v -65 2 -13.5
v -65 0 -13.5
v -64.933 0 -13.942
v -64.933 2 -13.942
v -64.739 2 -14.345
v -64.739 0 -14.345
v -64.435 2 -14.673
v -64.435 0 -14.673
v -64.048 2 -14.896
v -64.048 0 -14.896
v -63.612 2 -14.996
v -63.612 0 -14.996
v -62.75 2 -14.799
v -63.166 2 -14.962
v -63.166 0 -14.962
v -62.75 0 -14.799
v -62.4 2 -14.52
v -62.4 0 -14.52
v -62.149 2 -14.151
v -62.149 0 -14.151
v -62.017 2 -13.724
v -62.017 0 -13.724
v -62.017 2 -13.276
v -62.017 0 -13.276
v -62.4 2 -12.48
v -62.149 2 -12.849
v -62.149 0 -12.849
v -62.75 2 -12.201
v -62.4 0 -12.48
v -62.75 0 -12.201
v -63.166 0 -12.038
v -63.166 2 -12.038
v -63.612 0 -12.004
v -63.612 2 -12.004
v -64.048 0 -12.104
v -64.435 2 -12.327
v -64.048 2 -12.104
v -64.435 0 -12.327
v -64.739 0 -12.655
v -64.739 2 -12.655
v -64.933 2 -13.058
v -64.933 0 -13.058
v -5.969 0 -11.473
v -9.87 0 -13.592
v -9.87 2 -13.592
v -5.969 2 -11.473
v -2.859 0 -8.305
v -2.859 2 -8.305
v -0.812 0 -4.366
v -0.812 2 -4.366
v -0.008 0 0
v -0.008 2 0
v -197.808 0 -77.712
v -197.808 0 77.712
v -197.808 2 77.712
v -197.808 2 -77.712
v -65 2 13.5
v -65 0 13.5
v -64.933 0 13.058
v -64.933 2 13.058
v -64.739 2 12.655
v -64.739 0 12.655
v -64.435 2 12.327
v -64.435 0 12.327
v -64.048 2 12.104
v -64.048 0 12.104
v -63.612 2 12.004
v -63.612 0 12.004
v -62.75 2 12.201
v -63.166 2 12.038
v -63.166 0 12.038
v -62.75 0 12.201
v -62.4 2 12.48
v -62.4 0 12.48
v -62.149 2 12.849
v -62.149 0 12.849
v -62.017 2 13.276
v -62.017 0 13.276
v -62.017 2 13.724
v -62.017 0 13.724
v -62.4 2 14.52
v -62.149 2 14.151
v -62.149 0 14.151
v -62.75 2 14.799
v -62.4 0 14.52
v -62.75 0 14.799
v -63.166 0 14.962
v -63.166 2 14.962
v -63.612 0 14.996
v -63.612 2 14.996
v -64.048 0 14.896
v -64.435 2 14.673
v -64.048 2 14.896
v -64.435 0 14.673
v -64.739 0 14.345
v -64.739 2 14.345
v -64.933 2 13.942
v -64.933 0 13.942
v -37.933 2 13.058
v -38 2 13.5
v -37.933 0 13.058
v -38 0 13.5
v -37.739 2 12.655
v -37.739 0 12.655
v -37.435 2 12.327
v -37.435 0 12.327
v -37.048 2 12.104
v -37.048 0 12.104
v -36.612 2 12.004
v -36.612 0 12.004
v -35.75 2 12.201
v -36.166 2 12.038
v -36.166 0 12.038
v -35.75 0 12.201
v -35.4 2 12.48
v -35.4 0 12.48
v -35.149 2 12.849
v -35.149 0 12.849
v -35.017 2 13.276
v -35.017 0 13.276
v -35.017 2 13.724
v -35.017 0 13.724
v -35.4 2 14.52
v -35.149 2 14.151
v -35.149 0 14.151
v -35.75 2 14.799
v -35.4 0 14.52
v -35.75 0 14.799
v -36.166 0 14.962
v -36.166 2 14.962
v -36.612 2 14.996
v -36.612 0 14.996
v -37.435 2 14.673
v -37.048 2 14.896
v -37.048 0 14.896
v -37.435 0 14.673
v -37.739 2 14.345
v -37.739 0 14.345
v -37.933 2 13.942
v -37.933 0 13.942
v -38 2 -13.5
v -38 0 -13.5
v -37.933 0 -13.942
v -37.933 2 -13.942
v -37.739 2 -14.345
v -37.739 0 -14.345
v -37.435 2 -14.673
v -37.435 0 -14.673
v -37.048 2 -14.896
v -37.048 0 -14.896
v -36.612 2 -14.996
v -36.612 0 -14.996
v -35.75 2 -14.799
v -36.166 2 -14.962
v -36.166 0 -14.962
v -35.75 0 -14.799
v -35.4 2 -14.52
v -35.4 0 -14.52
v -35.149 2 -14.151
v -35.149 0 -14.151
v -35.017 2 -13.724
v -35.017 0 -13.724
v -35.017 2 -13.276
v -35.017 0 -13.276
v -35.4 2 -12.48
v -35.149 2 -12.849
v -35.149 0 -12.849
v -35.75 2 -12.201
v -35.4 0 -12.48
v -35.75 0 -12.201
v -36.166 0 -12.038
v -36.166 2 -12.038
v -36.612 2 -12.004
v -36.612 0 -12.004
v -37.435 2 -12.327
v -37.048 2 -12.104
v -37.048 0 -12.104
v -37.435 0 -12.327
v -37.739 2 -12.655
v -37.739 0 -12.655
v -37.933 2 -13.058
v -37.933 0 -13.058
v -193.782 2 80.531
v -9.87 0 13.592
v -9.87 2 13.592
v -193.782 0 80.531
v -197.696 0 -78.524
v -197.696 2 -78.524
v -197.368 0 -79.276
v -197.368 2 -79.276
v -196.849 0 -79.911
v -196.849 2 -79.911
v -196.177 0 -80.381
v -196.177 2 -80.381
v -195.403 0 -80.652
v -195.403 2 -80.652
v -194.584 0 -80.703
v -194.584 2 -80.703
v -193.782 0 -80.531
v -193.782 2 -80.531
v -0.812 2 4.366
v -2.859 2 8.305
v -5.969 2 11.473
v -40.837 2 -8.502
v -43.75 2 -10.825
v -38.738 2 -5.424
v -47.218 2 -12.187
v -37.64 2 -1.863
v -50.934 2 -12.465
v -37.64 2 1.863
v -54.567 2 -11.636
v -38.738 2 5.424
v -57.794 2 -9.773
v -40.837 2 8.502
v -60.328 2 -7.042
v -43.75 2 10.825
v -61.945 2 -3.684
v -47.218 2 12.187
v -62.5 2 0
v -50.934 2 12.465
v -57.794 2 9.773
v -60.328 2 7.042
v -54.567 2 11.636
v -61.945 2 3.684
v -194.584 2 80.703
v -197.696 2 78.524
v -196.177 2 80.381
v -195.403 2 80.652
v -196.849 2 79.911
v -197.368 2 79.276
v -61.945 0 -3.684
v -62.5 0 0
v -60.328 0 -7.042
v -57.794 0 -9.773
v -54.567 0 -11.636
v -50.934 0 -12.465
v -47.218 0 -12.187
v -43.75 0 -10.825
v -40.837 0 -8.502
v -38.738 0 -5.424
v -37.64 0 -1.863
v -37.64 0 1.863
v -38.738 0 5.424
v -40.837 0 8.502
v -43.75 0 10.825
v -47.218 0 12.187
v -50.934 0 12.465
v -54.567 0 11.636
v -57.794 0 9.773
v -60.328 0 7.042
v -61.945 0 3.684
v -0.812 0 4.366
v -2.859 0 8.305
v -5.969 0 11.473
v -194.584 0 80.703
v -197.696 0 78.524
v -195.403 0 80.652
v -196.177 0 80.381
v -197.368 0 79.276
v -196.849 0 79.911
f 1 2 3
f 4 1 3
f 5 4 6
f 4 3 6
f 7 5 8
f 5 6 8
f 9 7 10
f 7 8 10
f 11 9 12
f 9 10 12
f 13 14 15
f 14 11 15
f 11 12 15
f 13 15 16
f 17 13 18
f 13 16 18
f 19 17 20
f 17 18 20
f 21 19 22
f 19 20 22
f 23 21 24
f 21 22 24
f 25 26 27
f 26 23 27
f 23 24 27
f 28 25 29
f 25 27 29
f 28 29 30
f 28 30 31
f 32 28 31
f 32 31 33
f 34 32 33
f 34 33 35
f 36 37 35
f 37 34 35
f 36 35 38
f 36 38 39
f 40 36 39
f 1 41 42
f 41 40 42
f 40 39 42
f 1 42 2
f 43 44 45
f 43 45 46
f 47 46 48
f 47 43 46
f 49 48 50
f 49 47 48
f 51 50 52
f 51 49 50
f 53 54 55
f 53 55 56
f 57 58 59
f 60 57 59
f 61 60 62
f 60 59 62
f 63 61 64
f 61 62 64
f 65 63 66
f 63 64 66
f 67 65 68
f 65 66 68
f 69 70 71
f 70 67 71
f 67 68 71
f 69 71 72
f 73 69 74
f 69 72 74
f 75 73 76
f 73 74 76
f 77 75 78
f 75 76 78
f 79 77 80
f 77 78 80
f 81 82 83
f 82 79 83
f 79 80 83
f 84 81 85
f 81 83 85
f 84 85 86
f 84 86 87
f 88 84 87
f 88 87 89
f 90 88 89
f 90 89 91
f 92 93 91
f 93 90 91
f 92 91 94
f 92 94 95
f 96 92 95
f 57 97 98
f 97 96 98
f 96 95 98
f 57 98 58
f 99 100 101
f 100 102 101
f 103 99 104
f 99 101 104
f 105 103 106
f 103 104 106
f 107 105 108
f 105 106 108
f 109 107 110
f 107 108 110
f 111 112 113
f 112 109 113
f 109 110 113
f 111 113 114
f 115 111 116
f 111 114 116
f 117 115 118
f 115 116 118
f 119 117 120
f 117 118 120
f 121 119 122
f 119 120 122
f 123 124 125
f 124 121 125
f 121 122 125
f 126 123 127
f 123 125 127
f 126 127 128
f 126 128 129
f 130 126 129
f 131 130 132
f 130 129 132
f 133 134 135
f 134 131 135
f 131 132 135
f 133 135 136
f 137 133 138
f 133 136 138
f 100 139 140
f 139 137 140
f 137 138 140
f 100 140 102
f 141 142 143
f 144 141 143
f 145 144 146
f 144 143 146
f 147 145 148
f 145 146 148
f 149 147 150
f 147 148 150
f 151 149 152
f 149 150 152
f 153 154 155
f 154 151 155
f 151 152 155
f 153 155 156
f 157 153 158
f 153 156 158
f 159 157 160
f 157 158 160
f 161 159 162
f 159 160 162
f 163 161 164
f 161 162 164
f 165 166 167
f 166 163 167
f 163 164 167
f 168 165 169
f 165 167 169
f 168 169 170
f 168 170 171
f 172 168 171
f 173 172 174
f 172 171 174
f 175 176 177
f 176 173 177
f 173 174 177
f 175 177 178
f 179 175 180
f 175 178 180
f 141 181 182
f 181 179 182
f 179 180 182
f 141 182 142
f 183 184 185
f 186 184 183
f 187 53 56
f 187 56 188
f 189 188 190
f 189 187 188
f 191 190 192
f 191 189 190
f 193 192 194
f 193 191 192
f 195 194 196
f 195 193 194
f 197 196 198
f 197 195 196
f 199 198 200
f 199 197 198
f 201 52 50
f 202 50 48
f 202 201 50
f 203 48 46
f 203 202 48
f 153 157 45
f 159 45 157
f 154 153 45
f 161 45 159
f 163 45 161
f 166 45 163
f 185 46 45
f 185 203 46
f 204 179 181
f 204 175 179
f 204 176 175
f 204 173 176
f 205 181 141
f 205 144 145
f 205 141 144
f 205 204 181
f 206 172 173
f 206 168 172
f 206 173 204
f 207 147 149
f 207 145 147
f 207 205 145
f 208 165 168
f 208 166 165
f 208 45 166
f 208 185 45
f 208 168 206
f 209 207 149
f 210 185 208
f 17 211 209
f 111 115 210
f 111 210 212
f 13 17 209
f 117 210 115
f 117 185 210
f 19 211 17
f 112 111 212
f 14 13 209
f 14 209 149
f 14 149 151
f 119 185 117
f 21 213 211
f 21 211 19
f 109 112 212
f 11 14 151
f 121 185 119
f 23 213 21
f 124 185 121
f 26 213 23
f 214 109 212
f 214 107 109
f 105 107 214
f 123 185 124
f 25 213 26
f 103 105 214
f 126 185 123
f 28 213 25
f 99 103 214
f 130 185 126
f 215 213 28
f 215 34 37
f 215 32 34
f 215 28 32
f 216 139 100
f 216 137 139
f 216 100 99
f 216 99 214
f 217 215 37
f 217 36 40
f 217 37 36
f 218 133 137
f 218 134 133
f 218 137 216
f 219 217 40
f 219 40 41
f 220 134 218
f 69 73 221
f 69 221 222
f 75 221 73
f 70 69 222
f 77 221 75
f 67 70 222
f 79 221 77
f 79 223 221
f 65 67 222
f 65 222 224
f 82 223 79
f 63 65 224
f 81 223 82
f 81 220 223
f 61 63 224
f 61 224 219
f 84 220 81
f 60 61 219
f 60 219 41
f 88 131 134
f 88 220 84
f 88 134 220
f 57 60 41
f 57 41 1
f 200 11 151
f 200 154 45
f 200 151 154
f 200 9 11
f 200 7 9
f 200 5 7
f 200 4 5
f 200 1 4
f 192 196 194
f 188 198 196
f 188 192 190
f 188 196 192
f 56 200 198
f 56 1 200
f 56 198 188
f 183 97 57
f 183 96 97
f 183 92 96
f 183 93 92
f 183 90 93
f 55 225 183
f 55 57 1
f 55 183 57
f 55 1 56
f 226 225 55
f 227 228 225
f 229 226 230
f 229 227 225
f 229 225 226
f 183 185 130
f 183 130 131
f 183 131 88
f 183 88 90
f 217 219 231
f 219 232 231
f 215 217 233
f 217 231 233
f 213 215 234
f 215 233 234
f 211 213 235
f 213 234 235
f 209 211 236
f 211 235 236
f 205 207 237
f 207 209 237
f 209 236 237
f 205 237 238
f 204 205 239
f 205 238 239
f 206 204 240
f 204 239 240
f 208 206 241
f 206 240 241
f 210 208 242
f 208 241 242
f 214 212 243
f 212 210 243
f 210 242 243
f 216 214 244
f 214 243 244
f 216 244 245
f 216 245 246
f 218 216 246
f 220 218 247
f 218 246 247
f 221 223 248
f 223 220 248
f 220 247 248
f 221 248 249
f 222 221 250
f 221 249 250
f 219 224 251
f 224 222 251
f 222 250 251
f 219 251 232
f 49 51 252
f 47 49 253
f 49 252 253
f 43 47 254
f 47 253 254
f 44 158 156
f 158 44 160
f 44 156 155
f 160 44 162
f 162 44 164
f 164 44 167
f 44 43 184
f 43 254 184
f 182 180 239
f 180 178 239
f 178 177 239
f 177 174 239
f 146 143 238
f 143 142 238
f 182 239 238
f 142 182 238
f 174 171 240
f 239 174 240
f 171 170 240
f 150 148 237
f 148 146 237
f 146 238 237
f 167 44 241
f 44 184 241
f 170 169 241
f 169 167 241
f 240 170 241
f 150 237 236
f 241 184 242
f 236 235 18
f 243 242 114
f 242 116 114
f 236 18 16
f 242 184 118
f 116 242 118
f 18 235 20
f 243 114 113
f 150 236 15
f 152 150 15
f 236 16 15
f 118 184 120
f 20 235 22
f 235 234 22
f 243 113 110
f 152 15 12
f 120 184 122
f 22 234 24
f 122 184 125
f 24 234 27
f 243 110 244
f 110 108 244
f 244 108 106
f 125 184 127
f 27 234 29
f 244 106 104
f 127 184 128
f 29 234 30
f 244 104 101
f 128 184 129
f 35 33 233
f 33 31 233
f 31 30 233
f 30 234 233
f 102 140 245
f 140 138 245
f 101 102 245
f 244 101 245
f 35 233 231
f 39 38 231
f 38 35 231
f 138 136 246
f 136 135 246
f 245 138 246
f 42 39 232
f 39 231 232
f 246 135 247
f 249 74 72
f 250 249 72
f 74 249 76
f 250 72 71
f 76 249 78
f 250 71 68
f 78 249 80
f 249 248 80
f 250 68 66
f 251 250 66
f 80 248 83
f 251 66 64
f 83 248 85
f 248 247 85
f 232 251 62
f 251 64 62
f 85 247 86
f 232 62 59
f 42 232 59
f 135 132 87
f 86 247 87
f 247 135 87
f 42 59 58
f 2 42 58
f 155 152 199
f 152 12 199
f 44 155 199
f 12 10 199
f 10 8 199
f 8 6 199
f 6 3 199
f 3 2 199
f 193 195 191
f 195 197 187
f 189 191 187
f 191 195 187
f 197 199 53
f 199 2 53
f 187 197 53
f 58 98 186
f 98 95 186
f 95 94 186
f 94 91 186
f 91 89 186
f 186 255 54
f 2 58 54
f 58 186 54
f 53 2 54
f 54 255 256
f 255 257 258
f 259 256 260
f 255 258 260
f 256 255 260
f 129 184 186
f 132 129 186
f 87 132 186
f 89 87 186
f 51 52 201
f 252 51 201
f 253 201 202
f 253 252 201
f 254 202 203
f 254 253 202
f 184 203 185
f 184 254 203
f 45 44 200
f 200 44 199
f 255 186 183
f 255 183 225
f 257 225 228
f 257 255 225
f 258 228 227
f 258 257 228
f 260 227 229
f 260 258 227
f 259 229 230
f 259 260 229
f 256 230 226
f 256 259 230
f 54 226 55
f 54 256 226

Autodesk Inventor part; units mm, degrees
ref_plane "YZ Plane" through (0, 0, 0) normal (1, 0, 0) x (0, 1, 0)
ref_plane "XZ Plane" through (0, 0, 0) normal (0, 1, 0) x (-1, 0, 0)
ref_plane "XY Plane" through (0, 0, 0) normal (0, 0, 1) x (1, 0, 0)
sketch "Sketch1" plane through (0, 0, 0) normal (0, 1, 0) x (-1, 0, 0)
  line L0 (0, 0) -> (0, -0.5031)
  line L1 (9.8697, 13.5923) -> (193.7822, 80.5309)
  line L2 (166.1465, 0) -> (0, 0) construction
  line L3 (0, 0) -> (0, 0.5031)
  line L4 (9.8697, -13.5923) -> (193.7822, -80.5309)
  circle A0 centre (50, 0) radius 12.5
  circle A1 centre (63.5, 13.5) radius 1.5
  circle A2 centre (63.5, -13.5) radius 1.5
  circle A3 centre (36.5, 13.5) radius 1.5
  circle A4 centre (36.5, -13.5) radius 1.5
  line L5 (63.5, 13.5) -> (36.5, -13.5) construction
  line L6 (36.5, 13.5) -> (63.5, -13.5) construction
  arc A5 (9.8697, 13.5923) -> (0, -0.5031) centre (15, -0.5031) ccw
  arc A6 (0, 0.5031) -> (9.8697, -13.5923) centre (15, 0.5031) ccw
  line L7 (63.25, 16.25) -> (36.75, 16.25)
  line L8 (33.75, 13.25) -> (33.75, -13.25)
  line L9 (36.75, -16.25) -> (63.25, -16.25)
  line L10 (66.25, -13.25) -> (66.25, 13.25)
  line L11 (66.25, 16.25) -> (33.75, -16.25) construction
  line L12 (33.75, 16.25) -> (66.25, -16.25) construction
  arc A7 (66.25, 13.25) -> (63.25, 16.25) centre (63.25, 13.25) ccw
  arc A8 (63.25, -16.25) -> (66.25, -13.25) centre (63.25, -13.25) ccw
  arc A9 (33.75, -13.25) -> (36.75, -16.25) centre (36.75, -13.25) ccw
  arc A10 (36.75, 16.25) -> (33.75, 13.25) centre (36.75, 13.25) ccw
  line L13 (197.8082, 77.7119) -> (197.8082, -77.7119)
  line L14 (190.7822, 76.2465) -> (10.8958, 10.7732)
  arc A11 (10.8958, 10.7732) -> (3, -0.5031) centre (15, -0.5031) ccw
  line L15 (3, -0.5031) -> (3, 0)
  line L16 (3, 0) -> (3, 0.5031)
  arc A12 (3, 0.5031) -> (10.8958, -10.7732) centre (15, 0.5031) ccw
  line L17 (10.8958, -10.7732) -> (190.7822, -76.2465)
  line L18 (194.8082, -73.4274) -> (194.8082, 73.4274)
  arc A13 (197.8082, 77.7119) -> (193.7822, 80.5309) centre (194.8082, 77.7119) ccw
  arc A14 (194.8082, 73.4274) -> (190.7822, 76.2465) centre (191.8082, 73.4274) ccw
  arc A15 (190.7822, -76.2465) -> (194.8082, -73.4274) centre (191.8082, -73.4274) ccw
  arc A16 (193.7822, -80.5309) -> (197.8082, -77.7119) centre (194.8082, -77.7119) ccw
  point P0 (0, 10)
  point P1 (197.8082, 81.9963)
  point P2 (0, -10)
  point P3 (197.8082, -81.9963)
  point P4 (50, 0)
  point P5 (194.8082, 77.7119)
  point P6 (194.8082, -77.7119)
  point P7 (0.0084, 0)
  point P8 (3.0106, 0)
  dimension "d1" = 25
  dimension "d2" = 50
  dimension "d3" = 27
  dimension "d4" = 27
  dimension "d5" = 3
  dimension "d6" = 15
  dimension "d7" = 10
  dimension "d9" = 70
  dimension "d10" = 32.5
  dimension "d11" = 3
  dimension "d12" = 200
  dimension "d13" = 3
  dimension "d20" = 3
extrude "Extrusion1" add sketch "Sketch1" along normal blind 2 contours A5 L1 A13 L13 A16 L4 A6 | A0 | A1 | A2 | A3 | A4 | A7 L10 A8 L9 A9 L8 A10 L7 | A14 L18 A15 L17 A12 A11 L14 | A11 L15 L16 A12
extrude "Extrusion2" cut sketch "Sketch1" along normal blind 2 contours A0 | A1 | A2 | A3 | A4
properties part number "PRTGN_baseipt"
